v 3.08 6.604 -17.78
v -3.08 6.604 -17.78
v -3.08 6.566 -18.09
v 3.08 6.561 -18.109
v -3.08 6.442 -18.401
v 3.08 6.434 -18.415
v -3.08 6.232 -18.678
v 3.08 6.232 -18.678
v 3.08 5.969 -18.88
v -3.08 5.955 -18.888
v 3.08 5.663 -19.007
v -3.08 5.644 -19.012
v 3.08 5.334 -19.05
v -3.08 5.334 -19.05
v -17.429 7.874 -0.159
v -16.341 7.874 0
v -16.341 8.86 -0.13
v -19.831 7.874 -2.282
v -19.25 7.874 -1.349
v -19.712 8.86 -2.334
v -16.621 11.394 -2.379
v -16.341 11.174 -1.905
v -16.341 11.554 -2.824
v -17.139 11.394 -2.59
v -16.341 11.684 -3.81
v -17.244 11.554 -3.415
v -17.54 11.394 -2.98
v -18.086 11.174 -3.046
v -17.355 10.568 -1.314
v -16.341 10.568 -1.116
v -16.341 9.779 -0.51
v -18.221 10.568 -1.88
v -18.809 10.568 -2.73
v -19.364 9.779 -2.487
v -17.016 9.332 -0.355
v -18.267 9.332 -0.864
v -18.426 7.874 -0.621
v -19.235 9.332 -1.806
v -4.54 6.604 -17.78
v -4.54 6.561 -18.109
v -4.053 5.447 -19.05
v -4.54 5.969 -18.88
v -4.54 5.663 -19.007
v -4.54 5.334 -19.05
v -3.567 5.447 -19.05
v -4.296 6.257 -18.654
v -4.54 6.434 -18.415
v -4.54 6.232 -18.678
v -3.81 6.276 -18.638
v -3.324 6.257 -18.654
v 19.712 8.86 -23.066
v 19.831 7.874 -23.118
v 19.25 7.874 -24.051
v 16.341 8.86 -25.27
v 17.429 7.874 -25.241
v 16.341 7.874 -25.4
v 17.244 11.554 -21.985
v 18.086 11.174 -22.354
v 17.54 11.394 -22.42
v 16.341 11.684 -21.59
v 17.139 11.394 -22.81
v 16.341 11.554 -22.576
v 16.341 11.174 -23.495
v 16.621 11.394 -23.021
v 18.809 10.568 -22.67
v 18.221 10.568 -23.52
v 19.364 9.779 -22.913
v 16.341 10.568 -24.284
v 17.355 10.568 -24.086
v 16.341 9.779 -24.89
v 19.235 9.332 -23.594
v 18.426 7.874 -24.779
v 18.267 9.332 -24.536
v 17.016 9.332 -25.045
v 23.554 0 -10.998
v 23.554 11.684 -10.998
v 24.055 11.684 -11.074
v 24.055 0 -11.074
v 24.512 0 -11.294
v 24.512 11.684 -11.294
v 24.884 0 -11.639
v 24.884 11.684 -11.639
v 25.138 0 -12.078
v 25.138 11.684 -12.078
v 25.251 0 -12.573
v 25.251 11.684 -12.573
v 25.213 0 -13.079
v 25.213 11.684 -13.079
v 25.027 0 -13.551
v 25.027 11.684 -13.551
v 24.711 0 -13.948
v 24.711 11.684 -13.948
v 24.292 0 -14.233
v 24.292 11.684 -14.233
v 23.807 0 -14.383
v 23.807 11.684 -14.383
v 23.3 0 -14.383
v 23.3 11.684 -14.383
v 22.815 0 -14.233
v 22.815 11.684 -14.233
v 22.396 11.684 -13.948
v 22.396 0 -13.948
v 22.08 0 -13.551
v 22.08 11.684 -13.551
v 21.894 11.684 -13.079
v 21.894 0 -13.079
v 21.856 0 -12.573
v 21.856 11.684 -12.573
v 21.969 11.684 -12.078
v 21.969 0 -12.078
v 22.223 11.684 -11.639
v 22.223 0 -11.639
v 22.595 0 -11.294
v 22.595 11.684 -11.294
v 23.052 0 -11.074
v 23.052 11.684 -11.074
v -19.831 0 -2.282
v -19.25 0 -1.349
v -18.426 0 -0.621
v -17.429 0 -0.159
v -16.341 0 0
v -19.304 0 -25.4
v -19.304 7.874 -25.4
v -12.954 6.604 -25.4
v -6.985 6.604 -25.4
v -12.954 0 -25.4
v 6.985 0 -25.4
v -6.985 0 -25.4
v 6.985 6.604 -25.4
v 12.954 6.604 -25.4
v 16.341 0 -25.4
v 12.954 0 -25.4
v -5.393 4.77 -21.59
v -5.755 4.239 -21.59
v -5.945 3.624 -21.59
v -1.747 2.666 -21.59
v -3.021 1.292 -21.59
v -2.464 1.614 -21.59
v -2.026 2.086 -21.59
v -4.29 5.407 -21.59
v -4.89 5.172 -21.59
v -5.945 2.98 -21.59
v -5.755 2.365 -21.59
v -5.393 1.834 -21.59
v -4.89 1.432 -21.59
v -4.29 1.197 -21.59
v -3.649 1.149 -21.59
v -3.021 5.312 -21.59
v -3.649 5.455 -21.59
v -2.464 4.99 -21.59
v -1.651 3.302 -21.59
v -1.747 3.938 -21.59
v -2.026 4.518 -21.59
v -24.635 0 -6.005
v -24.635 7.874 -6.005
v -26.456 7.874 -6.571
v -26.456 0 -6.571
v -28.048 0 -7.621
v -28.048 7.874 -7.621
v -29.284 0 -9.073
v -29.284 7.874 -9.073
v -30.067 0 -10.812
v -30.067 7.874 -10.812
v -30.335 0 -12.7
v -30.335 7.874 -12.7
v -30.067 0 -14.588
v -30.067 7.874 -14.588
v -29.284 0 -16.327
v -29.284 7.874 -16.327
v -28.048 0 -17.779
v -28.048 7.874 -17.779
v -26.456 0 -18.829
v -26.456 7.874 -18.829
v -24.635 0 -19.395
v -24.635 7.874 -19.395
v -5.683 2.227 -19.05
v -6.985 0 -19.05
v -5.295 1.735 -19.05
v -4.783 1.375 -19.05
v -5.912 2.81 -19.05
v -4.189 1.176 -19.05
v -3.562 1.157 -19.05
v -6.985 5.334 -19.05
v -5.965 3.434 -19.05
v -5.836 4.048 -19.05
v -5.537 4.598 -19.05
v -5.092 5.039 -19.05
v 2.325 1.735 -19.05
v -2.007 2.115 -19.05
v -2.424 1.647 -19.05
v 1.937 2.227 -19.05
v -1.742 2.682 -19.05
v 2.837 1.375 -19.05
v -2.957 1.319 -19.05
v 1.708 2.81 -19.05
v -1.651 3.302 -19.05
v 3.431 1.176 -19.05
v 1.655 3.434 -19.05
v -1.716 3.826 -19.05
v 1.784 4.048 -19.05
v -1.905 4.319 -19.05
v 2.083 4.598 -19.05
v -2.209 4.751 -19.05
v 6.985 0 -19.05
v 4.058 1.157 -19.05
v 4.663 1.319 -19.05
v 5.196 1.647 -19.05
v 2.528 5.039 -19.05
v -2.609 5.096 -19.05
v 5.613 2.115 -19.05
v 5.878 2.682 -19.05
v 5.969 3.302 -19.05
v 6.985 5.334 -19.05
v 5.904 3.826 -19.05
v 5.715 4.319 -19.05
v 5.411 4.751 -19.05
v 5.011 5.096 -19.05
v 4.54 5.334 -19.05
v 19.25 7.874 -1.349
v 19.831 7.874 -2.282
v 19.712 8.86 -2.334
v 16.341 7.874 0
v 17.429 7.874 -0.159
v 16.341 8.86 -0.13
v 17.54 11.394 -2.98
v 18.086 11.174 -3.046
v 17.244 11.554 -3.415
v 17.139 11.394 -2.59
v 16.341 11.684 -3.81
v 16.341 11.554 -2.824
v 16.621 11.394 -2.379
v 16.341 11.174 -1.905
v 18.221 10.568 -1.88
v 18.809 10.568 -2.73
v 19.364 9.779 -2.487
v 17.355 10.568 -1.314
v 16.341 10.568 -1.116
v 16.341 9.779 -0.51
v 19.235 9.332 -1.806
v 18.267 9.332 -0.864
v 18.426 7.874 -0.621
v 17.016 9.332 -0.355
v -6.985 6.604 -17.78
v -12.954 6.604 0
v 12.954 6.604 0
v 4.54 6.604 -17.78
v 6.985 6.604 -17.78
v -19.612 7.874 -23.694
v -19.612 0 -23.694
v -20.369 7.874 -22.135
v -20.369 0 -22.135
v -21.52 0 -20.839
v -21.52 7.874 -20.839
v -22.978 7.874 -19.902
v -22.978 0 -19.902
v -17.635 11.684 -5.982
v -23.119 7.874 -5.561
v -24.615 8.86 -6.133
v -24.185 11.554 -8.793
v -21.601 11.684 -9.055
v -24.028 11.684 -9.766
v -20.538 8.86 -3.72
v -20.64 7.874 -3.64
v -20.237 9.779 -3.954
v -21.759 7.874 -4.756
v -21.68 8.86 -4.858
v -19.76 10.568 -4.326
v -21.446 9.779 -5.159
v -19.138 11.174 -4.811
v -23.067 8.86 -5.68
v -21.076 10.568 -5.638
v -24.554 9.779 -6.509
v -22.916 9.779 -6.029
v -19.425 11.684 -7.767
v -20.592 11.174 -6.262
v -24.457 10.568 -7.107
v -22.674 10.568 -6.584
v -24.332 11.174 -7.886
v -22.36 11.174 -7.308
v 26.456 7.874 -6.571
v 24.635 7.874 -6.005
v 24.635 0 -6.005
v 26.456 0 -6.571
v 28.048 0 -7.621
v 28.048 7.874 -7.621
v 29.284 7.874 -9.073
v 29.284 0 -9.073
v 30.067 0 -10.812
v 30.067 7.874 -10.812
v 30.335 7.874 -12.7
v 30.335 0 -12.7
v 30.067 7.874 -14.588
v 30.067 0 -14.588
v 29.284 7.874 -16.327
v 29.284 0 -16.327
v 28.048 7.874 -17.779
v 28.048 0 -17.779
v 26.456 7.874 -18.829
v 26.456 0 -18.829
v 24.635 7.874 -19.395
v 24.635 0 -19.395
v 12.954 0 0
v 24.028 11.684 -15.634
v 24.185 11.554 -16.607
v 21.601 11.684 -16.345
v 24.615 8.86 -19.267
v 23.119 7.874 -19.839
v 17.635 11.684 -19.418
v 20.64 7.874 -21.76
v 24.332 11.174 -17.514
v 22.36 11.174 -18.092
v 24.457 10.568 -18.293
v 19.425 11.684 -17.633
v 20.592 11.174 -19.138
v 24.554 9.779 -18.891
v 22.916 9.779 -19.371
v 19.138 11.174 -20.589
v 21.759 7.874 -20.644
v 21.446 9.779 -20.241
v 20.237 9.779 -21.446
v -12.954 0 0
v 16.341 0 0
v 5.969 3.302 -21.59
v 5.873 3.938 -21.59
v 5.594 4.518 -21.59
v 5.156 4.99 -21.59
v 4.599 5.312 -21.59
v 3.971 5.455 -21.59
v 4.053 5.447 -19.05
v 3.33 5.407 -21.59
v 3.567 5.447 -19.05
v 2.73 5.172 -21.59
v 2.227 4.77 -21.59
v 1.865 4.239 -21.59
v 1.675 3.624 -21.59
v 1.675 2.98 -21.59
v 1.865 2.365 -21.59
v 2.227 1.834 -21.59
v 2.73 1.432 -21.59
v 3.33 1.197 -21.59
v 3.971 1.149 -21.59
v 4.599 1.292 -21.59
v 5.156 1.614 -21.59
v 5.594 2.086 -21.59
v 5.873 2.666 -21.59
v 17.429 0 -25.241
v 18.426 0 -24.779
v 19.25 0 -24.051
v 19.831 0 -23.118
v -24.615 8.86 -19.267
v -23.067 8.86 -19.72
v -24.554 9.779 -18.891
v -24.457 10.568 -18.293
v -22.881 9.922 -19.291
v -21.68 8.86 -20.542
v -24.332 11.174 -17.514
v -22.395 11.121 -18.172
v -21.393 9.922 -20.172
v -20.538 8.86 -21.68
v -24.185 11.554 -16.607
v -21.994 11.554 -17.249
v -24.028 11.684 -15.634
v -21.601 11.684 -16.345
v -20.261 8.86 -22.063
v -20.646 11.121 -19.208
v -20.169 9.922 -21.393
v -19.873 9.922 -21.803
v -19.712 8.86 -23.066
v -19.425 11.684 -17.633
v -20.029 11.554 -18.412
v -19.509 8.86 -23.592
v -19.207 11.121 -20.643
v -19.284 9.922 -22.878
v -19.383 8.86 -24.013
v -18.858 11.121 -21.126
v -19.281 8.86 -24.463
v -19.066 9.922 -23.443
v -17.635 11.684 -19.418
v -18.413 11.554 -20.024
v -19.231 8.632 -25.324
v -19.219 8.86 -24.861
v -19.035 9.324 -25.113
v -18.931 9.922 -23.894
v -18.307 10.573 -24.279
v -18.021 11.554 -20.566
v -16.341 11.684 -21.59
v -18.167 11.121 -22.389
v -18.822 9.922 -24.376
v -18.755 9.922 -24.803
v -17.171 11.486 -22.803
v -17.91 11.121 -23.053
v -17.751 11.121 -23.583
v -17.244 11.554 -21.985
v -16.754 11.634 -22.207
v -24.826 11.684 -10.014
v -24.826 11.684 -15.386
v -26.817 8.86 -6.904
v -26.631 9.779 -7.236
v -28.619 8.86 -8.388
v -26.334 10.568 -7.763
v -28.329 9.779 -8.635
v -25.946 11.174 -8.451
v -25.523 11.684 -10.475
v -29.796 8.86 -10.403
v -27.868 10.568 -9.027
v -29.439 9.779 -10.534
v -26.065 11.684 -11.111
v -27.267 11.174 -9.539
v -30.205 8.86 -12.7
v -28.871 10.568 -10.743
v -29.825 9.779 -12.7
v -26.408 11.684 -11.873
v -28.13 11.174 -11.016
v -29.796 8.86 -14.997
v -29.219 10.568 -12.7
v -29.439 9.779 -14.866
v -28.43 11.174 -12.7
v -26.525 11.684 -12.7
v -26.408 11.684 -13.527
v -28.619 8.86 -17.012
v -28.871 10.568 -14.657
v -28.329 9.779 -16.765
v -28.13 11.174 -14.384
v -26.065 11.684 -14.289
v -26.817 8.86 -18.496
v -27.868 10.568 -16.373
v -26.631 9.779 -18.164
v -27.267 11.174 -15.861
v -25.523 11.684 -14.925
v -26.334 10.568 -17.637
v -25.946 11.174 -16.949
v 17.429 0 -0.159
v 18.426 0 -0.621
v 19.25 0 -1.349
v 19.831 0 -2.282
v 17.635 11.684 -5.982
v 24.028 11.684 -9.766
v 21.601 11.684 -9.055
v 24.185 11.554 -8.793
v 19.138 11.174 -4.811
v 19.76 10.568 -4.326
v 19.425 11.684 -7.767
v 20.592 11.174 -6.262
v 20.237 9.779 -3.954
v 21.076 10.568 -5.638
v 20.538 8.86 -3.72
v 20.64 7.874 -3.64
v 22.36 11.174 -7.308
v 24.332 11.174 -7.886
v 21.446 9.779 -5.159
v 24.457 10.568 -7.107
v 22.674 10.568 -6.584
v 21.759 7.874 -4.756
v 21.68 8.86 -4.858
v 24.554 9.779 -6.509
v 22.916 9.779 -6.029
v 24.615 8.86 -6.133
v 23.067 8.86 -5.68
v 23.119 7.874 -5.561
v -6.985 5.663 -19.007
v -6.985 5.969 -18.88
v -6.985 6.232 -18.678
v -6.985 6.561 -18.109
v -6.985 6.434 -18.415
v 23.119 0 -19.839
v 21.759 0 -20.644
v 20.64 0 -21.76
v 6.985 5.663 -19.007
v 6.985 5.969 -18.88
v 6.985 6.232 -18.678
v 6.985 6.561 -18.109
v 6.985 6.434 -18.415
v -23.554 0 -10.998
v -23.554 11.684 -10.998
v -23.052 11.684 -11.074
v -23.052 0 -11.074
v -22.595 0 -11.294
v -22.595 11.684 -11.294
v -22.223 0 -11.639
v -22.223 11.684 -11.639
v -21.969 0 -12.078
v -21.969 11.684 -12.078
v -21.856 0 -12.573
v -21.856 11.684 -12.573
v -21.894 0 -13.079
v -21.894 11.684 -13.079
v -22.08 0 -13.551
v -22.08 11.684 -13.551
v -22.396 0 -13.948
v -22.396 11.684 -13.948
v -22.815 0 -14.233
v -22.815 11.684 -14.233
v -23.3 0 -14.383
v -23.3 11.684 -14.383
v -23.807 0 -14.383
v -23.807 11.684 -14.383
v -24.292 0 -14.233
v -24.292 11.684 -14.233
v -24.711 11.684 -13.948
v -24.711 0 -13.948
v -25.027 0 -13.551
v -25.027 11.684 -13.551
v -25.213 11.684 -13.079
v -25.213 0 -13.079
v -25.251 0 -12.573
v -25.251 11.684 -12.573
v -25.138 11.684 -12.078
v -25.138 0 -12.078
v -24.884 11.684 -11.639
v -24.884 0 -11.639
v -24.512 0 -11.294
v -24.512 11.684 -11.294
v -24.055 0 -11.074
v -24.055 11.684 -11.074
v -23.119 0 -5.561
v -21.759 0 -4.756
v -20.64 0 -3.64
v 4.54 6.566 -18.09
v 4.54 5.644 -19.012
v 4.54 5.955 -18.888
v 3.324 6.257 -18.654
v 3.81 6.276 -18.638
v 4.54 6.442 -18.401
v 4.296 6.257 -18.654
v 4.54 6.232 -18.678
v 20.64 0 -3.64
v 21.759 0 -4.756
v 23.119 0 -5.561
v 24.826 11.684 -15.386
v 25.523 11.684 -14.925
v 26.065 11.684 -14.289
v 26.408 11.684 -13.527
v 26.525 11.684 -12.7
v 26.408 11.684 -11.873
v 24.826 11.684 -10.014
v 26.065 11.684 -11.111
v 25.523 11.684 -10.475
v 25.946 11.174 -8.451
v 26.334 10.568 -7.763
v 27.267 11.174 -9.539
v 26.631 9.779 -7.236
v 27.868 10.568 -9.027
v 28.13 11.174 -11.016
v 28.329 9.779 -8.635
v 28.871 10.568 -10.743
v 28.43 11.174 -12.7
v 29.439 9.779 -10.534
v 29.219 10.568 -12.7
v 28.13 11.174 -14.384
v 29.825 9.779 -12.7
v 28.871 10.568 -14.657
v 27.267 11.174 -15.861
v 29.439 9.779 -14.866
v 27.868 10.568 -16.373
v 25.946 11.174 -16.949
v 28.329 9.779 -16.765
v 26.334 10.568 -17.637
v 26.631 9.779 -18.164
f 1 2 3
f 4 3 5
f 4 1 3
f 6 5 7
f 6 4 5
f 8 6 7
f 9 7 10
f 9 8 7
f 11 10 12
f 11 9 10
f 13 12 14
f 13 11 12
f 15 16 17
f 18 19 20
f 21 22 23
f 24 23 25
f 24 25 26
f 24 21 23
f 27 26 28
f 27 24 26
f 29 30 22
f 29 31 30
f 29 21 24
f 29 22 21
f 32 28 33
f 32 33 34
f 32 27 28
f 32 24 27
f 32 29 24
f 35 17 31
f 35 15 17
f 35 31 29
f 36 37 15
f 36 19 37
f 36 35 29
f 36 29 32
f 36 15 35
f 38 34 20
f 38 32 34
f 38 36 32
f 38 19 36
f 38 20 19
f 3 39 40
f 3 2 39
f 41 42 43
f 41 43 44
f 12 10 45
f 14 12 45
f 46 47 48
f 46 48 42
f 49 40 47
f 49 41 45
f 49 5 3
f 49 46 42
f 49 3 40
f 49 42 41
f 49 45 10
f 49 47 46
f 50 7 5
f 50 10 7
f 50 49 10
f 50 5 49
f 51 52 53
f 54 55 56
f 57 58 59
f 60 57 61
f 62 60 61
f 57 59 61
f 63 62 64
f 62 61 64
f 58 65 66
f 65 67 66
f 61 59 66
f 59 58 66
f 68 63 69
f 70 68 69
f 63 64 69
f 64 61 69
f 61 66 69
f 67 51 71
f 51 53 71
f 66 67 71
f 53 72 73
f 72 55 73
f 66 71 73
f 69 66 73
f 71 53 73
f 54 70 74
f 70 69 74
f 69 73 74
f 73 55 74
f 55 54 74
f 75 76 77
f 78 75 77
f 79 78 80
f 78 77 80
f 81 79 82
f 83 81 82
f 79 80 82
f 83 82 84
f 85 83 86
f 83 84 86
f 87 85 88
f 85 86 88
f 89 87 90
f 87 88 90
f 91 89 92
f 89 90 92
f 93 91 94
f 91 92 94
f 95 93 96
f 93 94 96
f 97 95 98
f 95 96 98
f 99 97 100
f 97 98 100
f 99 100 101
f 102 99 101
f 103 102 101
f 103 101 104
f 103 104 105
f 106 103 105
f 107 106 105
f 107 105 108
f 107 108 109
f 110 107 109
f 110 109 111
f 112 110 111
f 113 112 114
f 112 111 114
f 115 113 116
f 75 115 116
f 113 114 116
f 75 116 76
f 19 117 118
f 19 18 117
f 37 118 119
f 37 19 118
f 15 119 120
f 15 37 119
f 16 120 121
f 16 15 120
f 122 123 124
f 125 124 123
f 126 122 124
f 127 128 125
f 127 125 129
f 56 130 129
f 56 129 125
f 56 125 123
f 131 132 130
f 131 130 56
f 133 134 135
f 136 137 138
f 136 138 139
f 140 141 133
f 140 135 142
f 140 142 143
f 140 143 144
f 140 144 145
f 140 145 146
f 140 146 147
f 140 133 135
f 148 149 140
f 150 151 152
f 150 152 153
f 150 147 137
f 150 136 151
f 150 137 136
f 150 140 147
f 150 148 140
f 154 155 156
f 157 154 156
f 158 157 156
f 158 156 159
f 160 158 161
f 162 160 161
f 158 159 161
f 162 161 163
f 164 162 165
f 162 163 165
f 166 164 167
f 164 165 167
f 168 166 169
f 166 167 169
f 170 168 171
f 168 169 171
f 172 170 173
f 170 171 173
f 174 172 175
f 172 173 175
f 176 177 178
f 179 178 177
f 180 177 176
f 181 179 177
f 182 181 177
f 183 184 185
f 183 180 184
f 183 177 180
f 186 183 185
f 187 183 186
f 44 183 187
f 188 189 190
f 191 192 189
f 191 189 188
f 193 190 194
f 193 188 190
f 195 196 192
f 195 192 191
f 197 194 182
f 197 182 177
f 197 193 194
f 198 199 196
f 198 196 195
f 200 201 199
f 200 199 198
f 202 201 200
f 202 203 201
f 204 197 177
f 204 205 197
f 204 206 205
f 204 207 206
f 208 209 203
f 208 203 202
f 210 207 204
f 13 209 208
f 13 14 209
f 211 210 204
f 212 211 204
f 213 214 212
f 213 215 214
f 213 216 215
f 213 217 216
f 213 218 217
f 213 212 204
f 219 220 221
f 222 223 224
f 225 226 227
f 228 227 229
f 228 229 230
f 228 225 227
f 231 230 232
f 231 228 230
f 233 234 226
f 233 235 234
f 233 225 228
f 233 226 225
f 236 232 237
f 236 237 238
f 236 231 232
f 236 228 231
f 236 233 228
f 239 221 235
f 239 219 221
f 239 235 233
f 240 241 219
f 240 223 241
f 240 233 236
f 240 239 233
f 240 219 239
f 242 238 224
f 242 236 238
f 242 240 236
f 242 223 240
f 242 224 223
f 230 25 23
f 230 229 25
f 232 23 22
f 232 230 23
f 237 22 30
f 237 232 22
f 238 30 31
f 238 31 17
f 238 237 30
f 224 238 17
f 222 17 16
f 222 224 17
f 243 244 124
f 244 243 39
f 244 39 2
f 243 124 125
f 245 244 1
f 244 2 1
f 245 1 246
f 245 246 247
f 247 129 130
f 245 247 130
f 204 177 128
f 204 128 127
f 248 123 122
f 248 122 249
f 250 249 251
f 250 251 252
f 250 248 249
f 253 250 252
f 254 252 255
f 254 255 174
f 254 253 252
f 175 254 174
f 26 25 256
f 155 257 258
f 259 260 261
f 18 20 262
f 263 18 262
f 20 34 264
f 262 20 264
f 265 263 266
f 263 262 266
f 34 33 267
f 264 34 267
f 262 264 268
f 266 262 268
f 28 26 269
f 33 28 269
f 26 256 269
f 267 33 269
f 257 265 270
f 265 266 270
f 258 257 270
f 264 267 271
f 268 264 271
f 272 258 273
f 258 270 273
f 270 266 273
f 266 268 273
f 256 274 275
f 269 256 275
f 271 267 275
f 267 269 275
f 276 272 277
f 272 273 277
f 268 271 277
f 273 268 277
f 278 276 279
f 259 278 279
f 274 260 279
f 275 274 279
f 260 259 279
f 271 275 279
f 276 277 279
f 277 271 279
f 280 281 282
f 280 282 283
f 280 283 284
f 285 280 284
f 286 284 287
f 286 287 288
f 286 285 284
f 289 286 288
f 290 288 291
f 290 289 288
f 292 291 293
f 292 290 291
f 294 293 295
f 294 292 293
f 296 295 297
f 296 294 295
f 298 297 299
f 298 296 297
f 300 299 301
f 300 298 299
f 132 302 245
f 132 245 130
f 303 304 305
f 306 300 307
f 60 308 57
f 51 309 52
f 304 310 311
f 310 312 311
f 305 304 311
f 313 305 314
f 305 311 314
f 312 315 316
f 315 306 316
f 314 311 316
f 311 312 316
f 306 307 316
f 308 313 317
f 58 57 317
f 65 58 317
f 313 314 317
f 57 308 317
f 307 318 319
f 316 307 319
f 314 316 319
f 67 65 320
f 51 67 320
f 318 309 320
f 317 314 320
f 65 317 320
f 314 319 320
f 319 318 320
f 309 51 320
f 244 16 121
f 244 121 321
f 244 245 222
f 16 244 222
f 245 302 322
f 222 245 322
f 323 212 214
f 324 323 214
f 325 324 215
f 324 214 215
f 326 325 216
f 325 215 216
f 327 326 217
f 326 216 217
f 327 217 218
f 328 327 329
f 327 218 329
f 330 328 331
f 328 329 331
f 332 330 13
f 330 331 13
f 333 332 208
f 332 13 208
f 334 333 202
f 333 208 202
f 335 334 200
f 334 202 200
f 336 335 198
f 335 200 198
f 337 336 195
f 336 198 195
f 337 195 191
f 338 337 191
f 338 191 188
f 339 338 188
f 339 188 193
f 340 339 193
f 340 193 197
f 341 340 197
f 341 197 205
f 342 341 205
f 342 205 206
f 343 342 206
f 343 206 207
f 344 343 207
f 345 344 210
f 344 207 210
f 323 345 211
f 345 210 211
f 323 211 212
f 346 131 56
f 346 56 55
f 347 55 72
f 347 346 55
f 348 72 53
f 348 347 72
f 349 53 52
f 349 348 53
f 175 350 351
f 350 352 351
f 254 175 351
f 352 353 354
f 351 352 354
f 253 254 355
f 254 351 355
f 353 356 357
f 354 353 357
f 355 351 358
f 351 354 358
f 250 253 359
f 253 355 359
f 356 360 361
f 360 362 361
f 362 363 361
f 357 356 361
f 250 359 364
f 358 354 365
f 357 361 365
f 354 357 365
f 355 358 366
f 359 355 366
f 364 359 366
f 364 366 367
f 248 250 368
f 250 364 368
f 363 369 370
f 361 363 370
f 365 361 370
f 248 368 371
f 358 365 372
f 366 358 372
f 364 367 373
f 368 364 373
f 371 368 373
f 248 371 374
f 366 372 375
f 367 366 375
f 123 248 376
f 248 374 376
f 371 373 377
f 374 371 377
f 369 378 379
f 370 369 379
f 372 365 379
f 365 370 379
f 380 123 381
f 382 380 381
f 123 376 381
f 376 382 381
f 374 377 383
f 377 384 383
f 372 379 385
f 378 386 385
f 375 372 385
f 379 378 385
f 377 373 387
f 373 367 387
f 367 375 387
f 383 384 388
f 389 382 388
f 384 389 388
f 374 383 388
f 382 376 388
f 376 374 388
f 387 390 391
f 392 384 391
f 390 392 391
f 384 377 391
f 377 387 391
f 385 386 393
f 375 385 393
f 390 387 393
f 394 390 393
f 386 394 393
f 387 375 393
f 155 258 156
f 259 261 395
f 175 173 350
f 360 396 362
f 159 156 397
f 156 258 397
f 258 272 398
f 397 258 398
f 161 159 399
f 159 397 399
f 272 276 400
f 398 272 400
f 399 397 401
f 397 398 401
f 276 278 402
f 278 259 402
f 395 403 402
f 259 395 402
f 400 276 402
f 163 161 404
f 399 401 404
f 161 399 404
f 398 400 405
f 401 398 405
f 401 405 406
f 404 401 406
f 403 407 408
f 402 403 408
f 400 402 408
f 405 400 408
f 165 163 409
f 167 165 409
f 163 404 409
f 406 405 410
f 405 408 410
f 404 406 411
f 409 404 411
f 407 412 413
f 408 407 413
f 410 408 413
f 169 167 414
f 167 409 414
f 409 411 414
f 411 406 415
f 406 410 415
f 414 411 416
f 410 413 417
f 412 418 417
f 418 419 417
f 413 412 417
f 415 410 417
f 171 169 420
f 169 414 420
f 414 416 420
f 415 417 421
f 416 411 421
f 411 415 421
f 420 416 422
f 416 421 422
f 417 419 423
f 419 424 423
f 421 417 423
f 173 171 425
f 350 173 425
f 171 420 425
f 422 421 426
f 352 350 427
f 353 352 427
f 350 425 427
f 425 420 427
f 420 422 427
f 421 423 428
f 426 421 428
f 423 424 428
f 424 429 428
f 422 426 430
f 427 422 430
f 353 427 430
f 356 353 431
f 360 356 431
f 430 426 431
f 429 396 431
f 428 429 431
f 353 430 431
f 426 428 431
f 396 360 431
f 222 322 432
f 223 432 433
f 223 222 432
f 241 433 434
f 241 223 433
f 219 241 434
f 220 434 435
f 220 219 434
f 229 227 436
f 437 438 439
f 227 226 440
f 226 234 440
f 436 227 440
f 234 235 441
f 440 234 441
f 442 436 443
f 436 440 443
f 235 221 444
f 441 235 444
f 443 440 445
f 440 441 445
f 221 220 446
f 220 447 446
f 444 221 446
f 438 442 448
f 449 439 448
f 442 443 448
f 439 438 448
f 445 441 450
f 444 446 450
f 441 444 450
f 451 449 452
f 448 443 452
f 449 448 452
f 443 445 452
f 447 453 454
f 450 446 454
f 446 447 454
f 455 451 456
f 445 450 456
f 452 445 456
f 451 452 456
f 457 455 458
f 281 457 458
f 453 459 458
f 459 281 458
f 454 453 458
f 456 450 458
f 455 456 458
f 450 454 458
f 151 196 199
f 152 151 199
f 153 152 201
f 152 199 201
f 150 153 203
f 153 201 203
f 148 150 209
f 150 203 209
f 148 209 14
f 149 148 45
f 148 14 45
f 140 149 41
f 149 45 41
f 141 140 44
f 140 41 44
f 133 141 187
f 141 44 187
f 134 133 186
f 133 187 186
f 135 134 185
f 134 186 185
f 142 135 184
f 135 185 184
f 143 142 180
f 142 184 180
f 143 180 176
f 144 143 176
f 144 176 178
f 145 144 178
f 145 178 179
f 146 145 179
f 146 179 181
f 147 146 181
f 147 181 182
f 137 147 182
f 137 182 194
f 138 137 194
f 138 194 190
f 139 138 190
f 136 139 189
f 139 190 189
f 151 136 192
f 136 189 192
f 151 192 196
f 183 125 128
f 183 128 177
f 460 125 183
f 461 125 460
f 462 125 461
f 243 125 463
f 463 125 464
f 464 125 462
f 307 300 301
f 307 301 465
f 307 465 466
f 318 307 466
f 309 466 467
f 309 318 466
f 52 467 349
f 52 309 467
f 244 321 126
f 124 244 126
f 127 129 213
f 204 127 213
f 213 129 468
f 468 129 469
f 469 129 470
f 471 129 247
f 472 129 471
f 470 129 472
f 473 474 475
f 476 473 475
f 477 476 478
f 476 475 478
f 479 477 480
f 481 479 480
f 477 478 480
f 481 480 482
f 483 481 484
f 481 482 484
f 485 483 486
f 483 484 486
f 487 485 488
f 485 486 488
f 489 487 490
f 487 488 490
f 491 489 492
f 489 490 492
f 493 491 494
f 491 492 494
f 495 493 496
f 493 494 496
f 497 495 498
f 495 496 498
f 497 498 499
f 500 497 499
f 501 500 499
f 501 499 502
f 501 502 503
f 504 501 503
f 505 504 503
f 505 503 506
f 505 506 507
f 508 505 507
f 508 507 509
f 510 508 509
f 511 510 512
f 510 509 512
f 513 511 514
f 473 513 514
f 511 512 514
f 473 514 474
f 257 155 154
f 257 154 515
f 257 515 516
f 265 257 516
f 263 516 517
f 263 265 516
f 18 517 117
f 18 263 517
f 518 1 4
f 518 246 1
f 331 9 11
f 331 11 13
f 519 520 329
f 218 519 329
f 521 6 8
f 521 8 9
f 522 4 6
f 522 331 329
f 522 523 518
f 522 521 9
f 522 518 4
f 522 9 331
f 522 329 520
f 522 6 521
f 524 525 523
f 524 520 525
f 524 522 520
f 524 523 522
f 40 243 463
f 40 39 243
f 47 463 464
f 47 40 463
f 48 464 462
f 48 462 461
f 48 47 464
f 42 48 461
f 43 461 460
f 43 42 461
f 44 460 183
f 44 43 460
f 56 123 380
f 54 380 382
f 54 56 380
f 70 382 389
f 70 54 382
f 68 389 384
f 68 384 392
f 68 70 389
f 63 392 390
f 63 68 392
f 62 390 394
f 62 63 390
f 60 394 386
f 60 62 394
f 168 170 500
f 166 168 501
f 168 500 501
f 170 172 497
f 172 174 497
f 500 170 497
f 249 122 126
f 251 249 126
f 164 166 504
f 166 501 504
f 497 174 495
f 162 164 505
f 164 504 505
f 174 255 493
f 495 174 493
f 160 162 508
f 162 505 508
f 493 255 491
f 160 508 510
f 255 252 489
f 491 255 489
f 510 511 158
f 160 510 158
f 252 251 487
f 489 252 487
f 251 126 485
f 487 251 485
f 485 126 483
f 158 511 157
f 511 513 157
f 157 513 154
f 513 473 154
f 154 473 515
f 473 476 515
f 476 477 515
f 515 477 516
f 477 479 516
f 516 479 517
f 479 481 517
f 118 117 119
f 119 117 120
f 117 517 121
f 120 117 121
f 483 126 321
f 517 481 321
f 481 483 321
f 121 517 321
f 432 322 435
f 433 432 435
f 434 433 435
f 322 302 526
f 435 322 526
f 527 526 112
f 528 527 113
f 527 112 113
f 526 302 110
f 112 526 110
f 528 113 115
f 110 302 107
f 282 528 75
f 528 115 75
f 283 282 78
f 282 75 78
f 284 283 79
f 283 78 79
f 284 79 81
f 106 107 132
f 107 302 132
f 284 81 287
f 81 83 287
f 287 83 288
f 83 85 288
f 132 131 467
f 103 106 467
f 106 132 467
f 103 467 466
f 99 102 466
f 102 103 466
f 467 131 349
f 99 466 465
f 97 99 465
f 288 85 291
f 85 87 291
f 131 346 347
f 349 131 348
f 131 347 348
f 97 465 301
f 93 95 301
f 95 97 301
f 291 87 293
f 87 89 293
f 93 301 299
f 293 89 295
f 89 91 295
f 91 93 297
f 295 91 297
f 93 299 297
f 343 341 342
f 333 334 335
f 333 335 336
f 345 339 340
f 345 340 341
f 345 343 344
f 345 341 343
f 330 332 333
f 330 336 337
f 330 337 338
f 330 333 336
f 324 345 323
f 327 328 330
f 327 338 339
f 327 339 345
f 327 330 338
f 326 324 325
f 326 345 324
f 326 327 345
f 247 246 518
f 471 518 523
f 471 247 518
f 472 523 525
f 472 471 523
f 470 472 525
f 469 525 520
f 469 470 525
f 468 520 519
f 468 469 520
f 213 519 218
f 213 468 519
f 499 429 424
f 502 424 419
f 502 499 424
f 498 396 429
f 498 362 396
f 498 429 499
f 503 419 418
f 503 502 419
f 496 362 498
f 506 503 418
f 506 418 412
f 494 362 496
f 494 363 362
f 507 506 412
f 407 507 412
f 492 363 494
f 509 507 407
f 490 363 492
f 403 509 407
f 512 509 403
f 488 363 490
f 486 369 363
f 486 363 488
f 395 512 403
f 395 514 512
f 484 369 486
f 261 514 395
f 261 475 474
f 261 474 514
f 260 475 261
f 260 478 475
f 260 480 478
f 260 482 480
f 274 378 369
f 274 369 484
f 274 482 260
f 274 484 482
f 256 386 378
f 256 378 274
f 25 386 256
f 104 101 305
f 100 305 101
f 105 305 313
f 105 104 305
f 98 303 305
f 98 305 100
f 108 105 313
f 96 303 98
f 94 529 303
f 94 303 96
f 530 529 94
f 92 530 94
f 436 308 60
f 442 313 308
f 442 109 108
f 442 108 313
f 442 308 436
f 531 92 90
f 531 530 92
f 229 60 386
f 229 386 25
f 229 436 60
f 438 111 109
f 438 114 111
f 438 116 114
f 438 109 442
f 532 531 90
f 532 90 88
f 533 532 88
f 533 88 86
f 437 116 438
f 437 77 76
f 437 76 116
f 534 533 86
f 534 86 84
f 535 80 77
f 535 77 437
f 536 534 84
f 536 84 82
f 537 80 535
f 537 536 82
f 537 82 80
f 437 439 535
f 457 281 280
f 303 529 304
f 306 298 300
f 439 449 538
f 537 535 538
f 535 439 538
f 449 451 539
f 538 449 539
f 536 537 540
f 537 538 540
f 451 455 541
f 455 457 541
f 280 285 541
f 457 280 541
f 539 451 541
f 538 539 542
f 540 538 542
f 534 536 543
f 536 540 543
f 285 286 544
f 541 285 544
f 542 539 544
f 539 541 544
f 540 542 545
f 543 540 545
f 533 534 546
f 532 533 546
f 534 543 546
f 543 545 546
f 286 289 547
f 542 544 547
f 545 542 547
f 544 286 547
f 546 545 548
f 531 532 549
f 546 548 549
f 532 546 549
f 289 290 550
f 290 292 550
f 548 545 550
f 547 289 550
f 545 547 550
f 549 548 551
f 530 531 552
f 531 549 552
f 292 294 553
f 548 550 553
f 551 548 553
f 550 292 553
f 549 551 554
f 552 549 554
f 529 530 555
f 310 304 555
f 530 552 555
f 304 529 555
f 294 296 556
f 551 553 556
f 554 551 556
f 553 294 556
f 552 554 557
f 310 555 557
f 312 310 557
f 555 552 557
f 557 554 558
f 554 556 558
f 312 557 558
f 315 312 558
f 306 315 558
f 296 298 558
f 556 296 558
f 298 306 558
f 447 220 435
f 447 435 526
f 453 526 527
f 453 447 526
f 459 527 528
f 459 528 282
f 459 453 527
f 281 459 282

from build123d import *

# Parameters (mm, degrees)
SKETCH1_W             = 6.35
SKETCH1_H             = 25.4
BOSS_EXTRUDE1_DEPTH   = 6.604
BOSS_EXTRUDE1_2_DEPTH = 6.604
SKETCH2_W             = 38.608
SKETCH2_H             = 25.4
BOSS_EXTRUDE2_DEPTH   = 5.08
SKETCH3_W             = 13.97
SKETCH3_H             = 6.35
BOSS_EXTRUDE3_DEPTH   = 6.604
SKETCH4_R             = 2.159
CUT_EXTRUDE1_DEPTH    = 2.54
SKETCH5_R             = 1.7018
BOSS_EXTRUDE4_DEPTH   = 11.684
FILLET1_R             = 6.35
FILLET2_R             = 3.81
FILLET3_R             = 1.27


with BuildPart() as part:
    # Sketch1 → Boss-Extrude1 (new body)
    with BuildSketch(Plane(origin=(0, 0, 0), x_dir=(1, 0, 0), z_dir=(0, 1, 0))):
        with Locations((16.129, 12.7)):
            Rectangle(SKETCH1_W, SKETCH1_H)
    extrude(amount=BOSS_EXTRUDE1_DEPTH)



with BuildPart() as body_2:
    # Sketch1 → Boss-Extrude1 2 (new body)
    with BuildSketch(Plane(origin=(0, 0, 0), x_dir=(1, 0, 0), z_dir=(0, 1, 0))):
        with Locations((-16.129, 12.7)):
            Rectangle(SKETCH1_W, SKETCH1_H)
    extrude(amount=BOSS_EXTRUDE1_2_DEPTH)


with BuildPart() as part_1:
    add(part.part)

    add(body_2.part)  # Boss-Extrude2 merges body 2
    # Sketch2 → Boss-Extrude2 (add)
    with BuildSketch(Plane(origin=(0, 6.604, 0), x_dir=(1, 0, 0), z_dir=(0, 1, 0))):
        with Locations((0, 12.7)):
            Rectangle(SKETCH2_W, SKETCH2_H)
    extrude(amount=BOSS_EXTRUDE2_DEPTH)

    # Sketch3 → Boss-Extrude3 (add)
    with BuildSketch(Plane.XZ.offset(-6.604)):
        with Locations((0, -22.225)):
            Rectangle(SKETCH3_W, SKETCH3_H)
    extrude(amount=BOSS_EXTRUDE3_DEPTH)

    # Sketch4 → Cut-Extrude1 (cut)
    with BuildSketch(Plane.XY.offset(-19.05)):
        with Locations((3.81, 3.302)):
            Circle(SKETCH4_R)
        with Locations((-3.81, 3.302)):
            Circle(SKETCH4_R)
    extrude(amount=-CUT_EXTRUDE1_DEPTH, mode=Mode.SUBTRACT)

    # Sketch5 → Boss-Extrude4 (add)
    # profile 1 of 2: a face of its own
    with BuildSketch(Plane(origin=(0, 11.684, 0), x_dir=(1, 0, 0), z_dir=(0, 1, 0))):
        with BuildLine():
            Line((-19.304, 17.985297981), (-19.304, 7.414702019))
            ThreePointArc((-19.304, 7.414702019), (-30.335321913, 12.7), (-19.304, 17.985297981))
        make_face()
        with Locations(Location((-23.553521913, 12.7, 0), (0, 0, 270))):
            Circle(SKETCH5_R, mode=Mode.SUBTRACT)
    # profile 2 of 2: a face of its own
    with BuildSketch(Plane(origin=(0, 11.684, 0), x_dir=(1, 0, 0), z_dir=(0, 1, 0))):
        with BuildLine():
            Line((19.304, 17.985297981), (19.304, 7.414702019))
            ThreePointArc((19.304, 7.414702019), (30.335321913, 12.7), (19.304, 17.985297981))
        make_face()
        with Locations(Location((23.553521913, 12.7, 0), (0, 0, 270))):
            Circle(SKETCH5_R, mode=Mode.SUBTRACT)
    extrude(amount=-BOSS_EXTRUDE4_DEPTH)

    # Fillet1
    # the kernel refuses this fillet: 6.35 mm, written as the material it adds along each edge
    with BuildSketch(Plane(origin=(-19.304, 11.684, -7.414702019), x_dir=(0, 0, 1), z_dir=(0, -1, 0)), Plane(origin=(19.304, 11.684, -17.985297981), x_dir=(0, 0, -1), z_dir=(0, -1, 0))) as fillet1_piece_1:
        with BuildLine():
            CenterArc((7.678309884, 6.344526057), FILLET1_R, 189.180006139, 78.44078763)
            Line((1.409640703, 5.331467961), (1.28426732, 5.311206799))
            ThreePointArc((1.28426732, 5.311206799), (1.148418354, 2.548446621), (-0.098975618, 0.079579062))
            Line((-0.098975618, 0.079579062), (0, -0.127))
            ThreePointArc((0, -0.127), (3.707351009, -0.127), (7.409429861, -0.126890521))
            Line((7.409429861, -0.126890521), (7.414702019, 0))
        make_face()
    extrude(amount=11.684)
    with BuildSketch(Plane(origin=(-19.304, 11.684, -17.985297981), x_dir=(0, 0, -1), z_dir=(0, -1, 0)), Plane(origin=(19.304, 11.684, -7.414702019), x_dir=(0, 0, 1), z_dir=(0, -1, 0))) as fillet1_piece_2:
        with BuildLine():
            CenterArc((7.678309884, -6.344526057), FILLET1_R, 92.379206231, 78.44078763)
            Line((1.409640703, -5.331467961), (1.28426732, -5.311206799))
            ThreePointArc((1.28426732, -5.311206799), (1.148418354, -2.548446621), (-0.098975618, -0.079579062))
            Line((-0.098975618, -0.079579062), (0, 0.127))
            ThreePointArc((0, 0.127), (3.707351009, 0.127), (7.409429861, 0.126890521))
            Line((7.409429861, 0.126890521), (7.414702019, 0))
        make_face()
    extrude(amount=11.684)

    # Fillet2
    fillet2_edges = [part_1.edges().sort_by_distance(p)[0] for p in [
        (20.899978754, 11.684, -21.447709562),
        (-19.304, 5.842, 0),
        (0, 11.684, 0),
        (0, 11.684, -25.4),
        (19.304, 5.842, 0),
        (19.304, 5.842, -25.4),
        (-30.335321913, 11.684, -12.7),
        (30.335321913, 11.684, -12.7),
        (-20.899978754, 11.684, -3.952290438),
        (-20.899978754, 11.684, -21.447709562),
        (20.899978754, 11.684, -3.952290438),
    ]]
    fillet(fillet2_edges, radius=FILLET2_R)

    # Fillet3
    fillet3_edges = [part_1.edges().sort_by_distance(p)[0] for p in [
        (0, 6.604, -19.05),
    ]]
    fillet(fillet3_edges, radius=FILLET3_R)


solid = part_1.part
